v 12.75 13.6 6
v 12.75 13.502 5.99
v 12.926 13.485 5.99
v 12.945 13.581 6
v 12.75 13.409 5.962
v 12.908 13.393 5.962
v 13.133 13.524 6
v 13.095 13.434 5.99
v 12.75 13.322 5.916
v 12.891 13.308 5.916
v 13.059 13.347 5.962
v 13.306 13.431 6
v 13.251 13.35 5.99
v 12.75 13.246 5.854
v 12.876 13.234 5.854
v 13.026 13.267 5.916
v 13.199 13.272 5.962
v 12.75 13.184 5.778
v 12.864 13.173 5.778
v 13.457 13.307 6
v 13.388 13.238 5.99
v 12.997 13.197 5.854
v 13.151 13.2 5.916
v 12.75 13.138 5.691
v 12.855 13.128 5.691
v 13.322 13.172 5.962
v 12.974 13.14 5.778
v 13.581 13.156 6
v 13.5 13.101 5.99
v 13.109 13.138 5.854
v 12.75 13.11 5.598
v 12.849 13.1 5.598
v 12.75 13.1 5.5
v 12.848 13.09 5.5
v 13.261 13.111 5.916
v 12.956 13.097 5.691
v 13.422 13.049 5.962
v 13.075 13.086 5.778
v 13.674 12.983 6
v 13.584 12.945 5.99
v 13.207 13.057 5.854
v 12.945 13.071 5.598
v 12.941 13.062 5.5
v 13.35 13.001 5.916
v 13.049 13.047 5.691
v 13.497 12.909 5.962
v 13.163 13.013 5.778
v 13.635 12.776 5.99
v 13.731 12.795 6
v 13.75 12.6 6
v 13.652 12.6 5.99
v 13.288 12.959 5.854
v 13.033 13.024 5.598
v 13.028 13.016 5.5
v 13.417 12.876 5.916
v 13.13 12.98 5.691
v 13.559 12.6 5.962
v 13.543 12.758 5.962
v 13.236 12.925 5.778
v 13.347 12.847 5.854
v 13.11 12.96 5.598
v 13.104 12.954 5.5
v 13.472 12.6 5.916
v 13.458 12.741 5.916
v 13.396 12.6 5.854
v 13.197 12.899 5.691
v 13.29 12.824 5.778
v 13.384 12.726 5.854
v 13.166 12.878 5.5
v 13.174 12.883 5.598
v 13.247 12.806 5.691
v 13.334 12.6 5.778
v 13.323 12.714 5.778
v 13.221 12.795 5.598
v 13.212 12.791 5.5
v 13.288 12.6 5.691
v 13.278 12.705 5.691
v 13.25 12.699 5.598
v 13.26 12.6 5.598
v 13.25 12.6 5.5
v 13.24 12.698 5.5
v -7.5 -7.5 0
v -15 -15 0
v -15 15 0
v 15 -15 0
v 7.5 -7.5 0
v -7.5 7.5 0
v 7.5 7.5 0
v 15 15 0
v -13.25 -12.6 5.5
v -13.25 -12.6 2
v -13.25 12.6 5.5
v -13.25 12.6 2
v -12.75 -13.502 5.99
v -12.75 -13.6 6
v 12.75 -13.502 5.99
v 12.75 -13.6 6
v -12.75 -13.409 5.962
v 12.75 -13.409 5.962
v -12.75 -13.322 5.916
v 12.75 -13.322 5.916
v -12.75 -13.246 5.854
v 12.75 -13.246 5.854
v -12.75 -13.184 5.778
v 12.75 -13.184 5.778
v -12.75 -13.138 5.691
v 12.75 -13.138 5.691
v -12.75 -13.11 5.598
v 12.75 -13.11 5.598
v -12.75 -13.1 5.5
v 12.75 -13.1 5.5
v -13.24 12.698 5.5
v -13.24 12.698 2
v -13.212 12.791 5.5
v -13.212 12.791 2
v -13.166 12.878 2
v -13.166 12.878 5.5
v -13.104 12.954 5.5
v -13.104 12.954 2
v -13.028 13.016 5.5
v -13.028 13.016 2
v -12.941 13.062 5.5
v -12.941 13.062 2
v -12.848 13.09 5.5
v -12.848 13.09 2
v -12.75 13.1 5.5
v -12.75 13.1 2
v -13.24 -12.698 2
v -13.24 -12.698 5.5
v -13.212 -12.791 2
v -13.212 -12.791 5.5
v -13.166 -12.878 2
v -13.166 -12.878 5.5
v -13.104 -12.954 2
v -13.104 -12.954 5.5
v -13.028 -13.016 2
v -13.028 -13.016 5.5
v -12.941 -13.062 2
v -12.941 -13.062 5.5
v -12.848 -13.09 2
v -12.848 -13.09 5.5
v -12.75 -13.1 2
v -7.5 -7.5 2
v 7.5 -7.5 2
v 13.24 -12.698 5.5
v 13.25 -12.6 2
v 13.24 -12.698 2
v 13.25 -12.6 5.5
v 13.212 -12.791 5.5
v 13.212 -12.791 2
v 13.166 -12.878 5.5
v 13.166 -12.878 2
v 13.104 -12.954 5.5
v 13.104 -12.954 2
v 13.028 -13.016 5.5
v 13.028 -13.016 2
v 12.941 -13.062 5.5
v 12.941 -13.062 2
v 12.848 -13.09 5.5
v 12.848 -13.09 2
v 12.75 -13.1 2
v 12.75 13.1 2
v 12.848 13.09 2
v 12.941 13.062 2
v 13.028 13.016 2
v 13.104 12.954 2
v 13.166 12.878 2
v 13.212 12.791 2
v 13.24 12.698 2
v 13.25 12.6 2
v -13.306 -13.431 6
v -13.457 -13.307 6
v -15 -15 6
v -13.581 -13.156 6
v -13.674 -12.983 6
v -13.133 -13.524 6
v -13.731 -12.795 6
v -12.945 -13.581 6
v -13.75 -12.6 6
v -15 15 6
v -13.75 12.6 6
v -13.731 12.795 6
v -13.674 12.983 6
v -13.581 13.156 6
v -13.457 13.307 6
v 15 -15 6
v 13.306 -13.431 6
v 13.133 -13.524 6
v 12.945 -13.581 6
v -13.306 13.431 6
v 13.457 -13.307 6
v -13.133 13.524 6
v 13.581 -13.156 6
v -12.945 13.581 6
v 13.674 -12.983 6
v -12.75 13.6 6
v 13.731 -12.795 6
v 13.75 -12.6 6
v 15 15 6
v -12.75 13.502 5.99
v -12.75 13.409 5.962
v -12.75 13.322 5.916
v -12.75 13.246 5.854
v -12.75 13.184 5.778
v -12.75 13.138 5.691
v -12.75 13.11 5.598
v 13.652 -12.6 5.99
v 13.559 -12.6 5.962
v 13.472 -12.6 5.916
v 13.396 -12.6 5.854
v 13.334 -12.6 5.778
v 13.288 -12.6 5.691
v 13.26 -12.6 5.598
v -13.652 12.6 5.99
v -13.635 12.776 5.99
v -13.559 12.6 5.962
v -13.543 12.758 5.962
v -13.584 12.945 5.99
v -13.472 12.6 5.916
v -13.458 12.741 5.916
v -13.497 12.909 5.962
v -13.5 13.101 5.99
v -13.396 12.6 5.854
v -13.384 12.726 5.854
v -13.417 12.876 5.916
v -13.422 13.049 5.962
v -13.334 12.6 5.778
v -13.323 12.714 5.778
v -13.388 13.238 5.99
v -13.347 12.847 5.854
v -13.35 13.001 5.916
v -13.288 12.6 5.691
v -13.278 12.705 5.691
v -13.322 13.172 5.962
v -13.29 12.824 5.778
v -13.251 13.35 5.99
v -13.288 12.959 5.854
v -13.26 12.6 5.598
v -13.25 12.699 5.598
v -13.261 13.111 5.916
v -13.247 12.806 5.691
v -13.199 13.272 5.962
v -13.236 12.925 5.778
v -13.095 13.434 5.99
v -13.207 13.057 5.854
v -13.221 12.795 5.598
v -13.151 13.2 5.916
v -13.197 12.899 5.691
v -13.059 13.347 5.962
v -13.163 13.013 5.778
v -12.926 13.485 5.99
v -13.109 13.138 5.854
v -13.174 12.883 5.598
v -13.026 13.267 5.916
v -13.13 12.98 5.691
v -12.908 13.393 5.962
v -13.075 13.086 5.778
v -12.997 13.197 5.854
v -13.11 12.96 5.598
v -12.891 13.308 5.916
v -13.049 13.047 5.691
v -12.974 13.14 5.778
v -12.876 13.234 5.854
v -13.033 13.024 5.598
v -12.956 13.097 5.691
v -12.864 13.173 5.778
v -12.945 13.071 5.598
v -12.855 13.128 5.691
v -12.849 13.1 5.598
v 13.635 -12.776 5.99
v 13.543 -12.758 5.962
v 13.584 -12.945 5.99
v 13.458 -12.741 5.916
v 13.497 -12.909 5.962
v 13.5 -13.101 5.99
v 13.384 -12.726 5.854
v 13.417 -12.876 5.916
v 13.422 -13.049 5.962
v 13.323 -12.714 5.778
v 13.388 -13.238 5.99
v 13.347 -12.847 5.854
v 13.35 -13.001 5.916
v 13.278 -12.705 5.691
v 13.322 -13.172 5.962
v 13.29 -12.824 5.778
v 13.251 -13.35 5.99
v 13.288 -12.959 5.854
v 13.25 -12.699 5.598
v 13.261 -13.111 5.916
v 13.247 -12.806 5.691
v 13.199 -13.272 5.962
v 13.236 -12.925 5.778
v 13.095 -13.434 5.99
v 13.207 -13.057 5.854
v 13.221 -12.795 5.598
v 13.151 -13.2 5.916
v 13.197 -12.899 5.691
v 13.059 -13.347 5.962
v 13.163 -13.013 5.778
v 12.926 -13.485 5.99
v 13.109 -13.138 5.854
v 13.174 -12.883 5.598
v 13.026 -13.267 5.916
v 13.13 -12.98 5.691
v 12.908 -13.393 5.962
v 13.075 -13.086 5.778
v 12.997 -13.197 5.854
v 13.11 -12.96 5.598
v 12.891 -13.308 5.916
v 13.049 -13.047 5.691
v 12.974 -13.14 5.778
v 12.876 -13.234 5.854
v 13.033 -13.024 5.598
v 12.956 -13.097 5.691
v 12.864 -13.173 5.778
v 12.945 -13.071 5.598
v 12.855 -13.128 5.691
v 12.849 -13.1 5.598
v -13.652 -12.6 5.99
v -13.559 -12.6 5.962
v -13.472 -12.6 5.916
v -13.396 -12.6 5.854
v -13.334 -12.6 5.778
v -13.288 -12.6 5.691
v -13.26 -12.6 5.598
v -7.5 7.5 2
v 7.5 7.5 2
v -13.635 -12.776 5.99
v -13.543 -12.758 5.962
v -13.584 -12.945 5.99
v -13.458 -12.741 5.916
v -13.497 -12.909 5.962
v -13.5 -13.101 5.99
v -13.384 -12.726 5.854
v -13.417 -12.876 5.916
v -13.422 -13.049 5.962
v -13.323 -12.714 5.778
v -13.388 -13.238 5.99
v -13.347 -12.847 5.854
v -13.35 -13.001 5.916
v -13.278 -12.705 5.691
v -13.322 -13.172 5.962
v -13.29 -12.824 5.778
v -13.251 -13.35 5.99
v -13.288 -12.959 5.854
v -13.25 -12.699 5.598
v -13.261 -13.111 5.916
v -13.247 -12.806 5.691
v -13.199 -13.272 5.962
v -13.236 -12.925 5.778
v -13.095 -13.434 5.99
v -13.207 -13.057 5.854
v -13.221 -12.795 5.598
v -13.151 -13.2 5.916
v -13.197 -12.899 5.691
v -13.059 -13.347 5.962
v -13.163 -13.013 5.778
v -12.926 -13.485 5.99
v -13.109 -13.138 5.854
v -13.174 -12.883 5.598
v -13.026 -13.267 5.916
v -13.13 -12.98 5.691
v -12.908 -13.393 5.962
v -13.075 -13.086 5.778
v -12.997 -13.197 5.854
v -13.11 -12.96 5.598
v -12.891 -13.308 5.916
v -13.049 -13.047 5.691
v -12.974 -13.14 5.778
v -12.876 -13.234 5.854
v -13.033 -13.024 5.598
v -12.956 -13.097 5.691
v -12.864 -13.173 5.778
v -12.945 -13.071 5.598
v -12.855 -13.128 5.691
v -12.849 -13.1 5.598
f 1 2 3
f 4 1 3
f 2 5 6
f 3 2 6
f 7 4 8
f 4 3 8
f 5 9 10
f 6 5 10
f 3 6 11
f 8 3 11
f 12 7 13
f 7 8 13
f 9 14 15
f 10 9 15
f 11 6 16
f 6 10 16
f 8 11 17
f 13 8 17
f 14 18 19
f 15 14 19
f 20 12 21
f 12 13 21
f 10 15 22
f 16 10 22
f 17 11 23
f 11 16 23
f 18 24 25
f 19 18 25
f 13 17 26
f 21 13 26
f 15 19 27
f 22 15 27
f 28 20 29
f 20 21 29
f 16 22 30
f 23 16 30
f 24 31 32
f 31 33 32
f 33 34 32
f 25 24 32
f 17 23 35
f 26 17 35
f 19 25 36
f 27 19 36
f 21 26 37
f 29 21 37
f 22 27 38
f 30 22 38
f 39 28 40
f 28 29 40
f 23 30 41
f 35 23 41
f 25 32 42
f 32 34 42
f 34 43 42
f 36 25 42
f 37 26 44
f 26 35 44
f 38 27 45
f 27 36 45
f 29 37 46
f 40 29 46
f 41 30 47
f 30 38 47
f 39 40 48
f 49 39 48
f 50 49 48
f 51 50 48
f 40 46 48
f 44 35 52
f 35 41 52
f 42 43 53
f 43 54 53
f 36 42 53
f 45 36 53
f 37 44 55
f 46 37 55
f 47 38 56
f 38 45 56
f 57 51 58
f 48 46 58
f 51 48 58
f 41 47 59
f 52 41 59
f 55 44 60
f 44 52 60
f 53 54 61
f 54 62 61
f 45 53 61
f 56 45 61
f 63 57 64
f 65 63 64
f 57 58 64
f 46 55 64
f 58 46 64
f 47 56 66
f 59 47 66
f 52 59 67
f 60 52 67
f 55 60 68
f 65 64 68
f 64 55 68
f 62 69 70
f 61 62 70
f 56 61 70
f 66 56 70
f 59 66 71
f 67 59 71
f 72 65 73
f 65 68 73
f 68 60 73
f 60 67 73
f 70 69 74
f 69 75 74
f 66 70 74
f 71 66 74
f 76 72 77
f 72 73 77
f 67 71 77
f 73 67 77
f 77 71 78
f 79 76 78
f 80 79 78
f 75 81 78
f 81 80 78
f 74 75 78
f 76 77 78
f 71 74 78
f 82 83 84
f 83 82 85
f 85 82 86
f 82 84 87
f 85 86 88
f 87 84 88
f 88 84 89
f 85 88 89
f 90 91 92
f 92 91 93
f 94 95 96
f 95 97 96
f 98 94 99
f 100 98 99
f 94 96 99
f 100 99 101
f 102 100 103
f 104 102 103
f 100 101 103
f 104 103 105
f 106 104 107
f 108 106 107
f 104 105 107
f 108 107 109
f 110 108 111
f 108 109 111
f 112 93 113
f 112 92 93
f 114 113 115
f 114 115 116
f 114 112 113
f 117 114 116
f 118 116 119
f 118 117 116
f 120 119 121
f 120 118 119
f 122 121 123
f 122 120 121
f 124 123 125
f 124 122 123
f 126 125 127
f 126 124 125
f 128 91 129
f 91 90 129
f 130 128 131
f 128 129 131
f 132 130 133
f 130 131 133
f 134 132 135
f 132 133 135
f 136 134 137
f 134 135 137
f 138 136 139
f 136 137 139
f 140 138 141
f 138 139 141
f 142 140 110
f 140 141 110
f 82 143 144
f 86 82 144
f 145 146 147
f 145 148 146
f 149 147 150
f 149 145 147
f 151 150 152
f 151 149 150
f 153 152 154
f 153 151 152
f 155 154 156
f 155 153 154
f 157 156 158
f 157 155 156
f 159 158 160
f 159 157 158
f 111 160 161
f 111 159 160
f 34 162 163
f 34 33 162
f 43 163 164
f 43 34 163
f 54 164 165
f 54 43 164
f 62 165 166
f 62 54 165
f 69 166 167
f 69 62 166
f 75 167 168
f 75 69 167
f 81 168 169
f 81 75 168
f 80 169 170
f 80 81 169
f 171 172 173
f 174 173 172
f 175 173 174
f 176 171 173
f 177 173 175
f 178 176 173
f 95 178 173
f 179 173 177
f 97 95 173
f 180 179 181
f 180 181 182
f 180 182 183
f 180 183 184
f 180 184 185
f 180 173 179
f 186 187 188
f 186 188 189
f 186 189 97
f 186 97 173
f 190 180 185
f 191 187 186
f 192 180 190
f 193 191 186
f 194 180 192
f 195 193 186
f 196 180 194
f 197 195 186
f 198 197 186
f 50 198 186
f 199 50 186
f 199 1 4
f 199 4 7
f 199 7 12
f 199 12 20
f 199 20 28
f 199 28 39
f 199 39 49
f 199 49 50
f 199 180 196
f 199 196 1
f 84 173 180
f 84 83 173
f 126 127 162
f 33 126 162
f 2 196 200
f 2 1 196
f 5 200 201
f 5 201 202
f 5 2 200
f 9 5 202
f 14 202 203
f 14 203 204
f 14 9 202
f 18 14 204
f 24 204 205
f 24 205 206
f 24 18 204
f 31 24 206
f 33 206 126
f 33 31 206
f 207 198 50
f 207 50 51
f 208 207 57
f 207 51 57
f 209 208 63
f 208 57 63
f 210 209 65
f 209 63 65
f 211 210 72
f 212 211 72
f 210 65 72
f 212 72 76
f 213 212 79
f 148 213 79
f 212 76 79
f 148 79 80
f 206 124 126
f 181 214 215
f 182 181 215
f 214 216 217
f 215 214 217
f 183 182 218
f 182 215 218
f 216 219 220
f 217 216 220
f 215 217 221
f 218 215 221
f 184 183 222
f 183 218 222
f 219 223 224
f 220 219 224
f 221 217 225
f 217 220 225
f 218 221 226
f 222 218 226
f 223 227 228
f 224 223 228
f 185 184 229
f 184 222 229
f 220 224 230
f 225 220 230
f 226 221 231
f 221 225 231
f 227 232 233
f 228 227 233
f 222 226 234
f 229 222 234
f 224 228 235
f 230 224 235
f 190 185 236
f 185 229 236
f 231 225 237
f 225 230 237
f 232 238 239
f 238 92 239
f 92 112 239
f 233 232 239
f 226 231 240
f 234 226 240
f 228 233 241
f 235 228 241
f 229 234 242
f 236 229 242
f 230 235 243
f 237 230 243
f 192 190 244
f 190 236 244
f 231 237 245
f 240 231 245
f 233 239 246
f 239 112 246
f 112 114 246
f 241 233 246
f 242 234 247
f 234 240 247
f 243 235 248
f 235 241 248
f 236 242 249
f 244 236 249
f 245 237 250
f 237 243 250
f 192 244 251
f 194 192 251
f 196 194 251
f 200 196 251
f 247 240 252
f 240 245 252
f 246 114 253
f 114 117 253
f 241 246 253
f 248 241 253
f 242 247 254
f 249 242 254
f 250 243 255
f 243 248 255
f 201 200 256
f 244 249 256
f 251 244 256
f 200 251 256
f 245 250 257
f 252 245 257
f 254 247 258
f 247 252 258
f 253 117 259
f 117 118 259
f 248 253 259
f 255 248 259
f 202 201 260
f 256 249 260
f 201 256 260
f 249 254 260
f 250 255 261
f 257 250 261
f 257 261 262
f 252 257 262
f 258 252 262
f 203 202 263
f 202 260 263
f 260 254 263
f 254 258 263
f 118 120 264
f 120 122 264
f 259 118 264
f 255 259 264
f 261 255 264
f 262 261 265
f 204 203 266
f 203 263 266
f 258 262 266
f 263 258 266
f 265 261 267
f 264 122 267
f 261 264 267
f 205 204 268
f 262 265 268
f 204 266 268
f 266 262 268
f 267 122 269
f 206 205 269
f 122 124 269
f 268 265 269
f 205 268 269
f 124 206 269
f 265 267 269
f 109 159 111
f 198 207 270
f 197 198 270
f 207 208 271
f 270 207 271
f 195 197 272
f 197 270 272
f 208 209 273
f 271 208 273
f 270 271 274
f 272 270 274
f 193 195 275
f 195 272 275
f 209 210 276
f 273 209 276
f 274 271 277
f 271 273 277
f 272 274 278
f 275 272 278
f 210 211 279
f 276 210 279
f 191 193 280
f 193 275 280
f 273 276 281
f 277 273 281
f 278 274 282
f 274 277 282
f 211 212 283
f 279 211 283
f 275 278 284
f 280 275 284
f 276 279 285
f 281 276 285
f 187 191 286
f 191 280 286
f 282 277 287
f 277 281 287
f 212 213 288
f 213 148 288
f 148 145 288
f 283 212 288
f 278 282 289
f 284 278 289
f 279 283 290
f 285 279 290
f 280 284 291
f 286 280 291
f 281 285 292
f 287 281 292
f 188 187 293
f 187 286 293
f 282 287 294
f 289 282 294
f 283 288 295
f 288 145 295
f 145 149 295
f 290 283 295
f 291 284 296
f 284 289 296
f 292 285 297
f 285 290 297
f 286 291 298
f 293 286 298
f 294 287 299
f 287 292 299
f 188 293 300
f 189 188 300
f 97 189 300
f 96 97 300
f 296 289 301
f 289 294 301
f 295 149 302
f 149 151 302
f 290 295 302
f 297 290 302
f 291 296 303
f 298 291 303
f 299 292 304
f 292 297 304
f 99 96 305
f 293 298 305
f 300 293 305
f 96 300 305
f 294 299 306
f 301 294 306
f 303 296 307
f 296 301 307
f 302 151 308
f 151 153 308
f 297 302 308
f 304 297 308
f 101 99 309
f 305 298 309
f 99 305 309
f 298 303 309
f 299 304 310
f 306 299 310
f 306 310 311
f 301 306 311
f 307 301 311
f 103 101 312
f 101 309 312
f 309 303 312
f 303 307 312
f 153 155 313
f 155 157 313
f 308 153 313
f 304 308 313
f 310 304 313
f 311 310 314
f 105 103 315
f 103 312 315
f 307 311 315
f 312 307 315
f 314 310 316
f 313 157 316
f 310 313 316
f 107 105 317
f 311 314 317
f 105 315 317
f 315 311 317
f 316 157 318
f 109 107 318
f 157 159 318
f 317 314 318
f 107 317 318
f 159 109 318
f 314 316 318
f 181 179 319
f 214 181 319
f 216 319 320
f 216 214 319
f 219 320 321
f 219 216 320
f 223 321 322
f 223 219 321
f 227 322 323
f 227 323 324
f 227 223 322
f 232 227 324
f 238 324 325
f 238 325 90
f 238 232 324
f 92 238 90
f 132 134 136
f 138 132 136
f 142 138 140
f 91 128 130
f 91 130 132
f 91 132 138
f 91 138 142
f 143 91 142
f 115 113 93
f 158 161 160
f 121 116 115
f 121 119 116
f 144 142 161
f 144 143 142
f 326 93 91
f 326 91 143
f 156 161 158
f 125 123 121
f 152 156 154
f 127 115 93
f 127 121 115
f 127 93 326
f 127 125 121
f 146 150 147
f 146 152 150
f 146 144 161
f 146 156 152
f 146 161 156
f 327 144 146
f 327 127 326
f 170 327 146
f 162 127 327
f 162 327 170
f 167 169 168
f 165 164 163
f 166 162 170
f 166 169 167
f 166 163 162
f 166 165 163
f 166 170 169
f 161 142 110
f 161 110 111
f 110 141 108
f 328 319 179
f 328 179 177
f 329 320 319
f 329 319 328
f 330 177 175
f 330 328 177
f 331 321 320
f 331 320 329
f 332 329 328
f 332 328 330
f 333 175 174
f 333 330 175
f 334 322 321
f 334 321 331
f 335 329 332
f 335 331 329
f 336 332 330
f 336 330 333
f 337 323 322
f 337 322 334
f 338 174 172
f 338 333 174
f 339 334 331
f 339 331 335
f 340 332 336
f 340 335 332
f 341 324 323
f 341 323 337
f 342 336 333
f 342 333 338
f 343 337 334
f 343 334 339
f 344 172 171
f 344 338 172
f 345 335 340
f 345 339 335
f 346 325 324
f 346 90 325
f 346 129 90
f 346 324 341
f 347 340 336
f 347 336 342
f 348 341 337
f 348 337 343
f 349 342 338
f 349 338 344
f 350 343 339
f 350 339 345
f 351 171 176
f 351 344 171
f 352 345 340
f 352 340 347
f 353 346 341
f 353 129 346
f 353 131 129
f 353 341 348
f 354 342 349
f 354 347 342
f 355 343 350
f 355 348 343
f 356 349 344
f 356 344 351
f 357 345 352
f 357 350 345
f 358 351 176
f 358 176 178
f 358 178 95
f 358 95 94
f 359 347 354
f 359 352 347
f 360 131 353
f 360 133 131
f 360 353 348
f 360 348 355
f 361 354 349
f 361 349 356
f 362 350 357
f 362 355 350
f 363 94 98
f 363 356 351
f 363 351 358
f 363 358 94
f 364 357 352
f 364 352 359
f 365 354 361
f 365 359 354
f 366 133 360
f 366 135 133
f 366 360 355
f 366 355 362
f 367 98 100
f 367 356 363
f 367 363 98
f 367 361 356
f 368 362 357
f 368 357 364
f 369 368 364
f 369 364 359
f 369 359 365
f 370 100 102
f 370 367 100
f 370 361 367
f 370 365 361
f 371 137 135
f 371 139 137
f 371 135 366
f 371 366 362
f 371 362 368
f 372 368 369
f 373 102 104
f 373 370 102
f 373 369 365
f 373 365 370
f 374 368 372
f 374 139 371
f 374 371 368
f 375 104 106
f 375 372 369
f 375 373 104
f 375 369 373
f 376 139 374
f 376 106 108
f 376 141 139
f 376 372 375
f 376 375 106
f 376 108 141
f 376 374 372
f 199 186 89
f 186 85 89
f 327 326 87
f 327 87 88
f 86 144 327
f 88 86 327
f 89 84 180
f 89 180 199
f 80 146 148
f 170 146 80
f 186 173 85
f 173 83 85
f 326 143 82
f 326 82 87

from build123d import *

# Parameters (mm, degrees)
F0_W     = 30
F0_H     = 30
F0_W_2   = 26
F0_H_2   = 26
F1_DEPTH = 2
F2_W     = 30
F2_H     = 30
F2_W_2   = 26.5
F2_H_2   = 26.2
F3_DEPTH = 4
F4_R     = 0.5
F5_W     = 15
F5_H     = 15
F6_DEPTH = 25


with BuildPart() as f1:
    # F0 (on Top) → F1 (new body)
    with BuildSketch(Plane.XY):
        Rectangle(F0_W, F0_H)
        Rectangle(F0_W_2, F0_H_2, mode=Mode.SUBTRACT)
        Rectangle(F0_W_2, F0_H_2)
    extrude(amount=F1_DEPTH)

    # F2 (on face) → F3 (join)
    with BuildSketch(Plane.XY.offset(2)):
        Rectangle(F2_W, F2_H)
        Rectangle(F2_W_2, F2_H_2, mode=Mode.SUBTRACT)
    extrude(amount=F3_DEPTH)

    # F4
    f4_edges = [f1.edges().sort_by_distance(p)[0] for p in [
        (-13.25, 0, 6),
        (0, 13.1, 6),
        (13.25, 0, 6),
        (0, -13.1, 6),
        (-13.25, 13.1, 4),
        (-13.25, -13.1, 4),
        (13.25, 13.1, 4),
        (13.25, -13.1, 4),
    ]]
    fillet(f4_edges, radius=F4_R)

    # F5 (on face) → F6 (cut)
    with BuildSketch(Plane.XY.offset(2)):
        Rectangle(F5_W, F5_H)
    extrude(amount=-F6_DEPTH, mode=Mode.SUBTRACT)


solid = f1.part
